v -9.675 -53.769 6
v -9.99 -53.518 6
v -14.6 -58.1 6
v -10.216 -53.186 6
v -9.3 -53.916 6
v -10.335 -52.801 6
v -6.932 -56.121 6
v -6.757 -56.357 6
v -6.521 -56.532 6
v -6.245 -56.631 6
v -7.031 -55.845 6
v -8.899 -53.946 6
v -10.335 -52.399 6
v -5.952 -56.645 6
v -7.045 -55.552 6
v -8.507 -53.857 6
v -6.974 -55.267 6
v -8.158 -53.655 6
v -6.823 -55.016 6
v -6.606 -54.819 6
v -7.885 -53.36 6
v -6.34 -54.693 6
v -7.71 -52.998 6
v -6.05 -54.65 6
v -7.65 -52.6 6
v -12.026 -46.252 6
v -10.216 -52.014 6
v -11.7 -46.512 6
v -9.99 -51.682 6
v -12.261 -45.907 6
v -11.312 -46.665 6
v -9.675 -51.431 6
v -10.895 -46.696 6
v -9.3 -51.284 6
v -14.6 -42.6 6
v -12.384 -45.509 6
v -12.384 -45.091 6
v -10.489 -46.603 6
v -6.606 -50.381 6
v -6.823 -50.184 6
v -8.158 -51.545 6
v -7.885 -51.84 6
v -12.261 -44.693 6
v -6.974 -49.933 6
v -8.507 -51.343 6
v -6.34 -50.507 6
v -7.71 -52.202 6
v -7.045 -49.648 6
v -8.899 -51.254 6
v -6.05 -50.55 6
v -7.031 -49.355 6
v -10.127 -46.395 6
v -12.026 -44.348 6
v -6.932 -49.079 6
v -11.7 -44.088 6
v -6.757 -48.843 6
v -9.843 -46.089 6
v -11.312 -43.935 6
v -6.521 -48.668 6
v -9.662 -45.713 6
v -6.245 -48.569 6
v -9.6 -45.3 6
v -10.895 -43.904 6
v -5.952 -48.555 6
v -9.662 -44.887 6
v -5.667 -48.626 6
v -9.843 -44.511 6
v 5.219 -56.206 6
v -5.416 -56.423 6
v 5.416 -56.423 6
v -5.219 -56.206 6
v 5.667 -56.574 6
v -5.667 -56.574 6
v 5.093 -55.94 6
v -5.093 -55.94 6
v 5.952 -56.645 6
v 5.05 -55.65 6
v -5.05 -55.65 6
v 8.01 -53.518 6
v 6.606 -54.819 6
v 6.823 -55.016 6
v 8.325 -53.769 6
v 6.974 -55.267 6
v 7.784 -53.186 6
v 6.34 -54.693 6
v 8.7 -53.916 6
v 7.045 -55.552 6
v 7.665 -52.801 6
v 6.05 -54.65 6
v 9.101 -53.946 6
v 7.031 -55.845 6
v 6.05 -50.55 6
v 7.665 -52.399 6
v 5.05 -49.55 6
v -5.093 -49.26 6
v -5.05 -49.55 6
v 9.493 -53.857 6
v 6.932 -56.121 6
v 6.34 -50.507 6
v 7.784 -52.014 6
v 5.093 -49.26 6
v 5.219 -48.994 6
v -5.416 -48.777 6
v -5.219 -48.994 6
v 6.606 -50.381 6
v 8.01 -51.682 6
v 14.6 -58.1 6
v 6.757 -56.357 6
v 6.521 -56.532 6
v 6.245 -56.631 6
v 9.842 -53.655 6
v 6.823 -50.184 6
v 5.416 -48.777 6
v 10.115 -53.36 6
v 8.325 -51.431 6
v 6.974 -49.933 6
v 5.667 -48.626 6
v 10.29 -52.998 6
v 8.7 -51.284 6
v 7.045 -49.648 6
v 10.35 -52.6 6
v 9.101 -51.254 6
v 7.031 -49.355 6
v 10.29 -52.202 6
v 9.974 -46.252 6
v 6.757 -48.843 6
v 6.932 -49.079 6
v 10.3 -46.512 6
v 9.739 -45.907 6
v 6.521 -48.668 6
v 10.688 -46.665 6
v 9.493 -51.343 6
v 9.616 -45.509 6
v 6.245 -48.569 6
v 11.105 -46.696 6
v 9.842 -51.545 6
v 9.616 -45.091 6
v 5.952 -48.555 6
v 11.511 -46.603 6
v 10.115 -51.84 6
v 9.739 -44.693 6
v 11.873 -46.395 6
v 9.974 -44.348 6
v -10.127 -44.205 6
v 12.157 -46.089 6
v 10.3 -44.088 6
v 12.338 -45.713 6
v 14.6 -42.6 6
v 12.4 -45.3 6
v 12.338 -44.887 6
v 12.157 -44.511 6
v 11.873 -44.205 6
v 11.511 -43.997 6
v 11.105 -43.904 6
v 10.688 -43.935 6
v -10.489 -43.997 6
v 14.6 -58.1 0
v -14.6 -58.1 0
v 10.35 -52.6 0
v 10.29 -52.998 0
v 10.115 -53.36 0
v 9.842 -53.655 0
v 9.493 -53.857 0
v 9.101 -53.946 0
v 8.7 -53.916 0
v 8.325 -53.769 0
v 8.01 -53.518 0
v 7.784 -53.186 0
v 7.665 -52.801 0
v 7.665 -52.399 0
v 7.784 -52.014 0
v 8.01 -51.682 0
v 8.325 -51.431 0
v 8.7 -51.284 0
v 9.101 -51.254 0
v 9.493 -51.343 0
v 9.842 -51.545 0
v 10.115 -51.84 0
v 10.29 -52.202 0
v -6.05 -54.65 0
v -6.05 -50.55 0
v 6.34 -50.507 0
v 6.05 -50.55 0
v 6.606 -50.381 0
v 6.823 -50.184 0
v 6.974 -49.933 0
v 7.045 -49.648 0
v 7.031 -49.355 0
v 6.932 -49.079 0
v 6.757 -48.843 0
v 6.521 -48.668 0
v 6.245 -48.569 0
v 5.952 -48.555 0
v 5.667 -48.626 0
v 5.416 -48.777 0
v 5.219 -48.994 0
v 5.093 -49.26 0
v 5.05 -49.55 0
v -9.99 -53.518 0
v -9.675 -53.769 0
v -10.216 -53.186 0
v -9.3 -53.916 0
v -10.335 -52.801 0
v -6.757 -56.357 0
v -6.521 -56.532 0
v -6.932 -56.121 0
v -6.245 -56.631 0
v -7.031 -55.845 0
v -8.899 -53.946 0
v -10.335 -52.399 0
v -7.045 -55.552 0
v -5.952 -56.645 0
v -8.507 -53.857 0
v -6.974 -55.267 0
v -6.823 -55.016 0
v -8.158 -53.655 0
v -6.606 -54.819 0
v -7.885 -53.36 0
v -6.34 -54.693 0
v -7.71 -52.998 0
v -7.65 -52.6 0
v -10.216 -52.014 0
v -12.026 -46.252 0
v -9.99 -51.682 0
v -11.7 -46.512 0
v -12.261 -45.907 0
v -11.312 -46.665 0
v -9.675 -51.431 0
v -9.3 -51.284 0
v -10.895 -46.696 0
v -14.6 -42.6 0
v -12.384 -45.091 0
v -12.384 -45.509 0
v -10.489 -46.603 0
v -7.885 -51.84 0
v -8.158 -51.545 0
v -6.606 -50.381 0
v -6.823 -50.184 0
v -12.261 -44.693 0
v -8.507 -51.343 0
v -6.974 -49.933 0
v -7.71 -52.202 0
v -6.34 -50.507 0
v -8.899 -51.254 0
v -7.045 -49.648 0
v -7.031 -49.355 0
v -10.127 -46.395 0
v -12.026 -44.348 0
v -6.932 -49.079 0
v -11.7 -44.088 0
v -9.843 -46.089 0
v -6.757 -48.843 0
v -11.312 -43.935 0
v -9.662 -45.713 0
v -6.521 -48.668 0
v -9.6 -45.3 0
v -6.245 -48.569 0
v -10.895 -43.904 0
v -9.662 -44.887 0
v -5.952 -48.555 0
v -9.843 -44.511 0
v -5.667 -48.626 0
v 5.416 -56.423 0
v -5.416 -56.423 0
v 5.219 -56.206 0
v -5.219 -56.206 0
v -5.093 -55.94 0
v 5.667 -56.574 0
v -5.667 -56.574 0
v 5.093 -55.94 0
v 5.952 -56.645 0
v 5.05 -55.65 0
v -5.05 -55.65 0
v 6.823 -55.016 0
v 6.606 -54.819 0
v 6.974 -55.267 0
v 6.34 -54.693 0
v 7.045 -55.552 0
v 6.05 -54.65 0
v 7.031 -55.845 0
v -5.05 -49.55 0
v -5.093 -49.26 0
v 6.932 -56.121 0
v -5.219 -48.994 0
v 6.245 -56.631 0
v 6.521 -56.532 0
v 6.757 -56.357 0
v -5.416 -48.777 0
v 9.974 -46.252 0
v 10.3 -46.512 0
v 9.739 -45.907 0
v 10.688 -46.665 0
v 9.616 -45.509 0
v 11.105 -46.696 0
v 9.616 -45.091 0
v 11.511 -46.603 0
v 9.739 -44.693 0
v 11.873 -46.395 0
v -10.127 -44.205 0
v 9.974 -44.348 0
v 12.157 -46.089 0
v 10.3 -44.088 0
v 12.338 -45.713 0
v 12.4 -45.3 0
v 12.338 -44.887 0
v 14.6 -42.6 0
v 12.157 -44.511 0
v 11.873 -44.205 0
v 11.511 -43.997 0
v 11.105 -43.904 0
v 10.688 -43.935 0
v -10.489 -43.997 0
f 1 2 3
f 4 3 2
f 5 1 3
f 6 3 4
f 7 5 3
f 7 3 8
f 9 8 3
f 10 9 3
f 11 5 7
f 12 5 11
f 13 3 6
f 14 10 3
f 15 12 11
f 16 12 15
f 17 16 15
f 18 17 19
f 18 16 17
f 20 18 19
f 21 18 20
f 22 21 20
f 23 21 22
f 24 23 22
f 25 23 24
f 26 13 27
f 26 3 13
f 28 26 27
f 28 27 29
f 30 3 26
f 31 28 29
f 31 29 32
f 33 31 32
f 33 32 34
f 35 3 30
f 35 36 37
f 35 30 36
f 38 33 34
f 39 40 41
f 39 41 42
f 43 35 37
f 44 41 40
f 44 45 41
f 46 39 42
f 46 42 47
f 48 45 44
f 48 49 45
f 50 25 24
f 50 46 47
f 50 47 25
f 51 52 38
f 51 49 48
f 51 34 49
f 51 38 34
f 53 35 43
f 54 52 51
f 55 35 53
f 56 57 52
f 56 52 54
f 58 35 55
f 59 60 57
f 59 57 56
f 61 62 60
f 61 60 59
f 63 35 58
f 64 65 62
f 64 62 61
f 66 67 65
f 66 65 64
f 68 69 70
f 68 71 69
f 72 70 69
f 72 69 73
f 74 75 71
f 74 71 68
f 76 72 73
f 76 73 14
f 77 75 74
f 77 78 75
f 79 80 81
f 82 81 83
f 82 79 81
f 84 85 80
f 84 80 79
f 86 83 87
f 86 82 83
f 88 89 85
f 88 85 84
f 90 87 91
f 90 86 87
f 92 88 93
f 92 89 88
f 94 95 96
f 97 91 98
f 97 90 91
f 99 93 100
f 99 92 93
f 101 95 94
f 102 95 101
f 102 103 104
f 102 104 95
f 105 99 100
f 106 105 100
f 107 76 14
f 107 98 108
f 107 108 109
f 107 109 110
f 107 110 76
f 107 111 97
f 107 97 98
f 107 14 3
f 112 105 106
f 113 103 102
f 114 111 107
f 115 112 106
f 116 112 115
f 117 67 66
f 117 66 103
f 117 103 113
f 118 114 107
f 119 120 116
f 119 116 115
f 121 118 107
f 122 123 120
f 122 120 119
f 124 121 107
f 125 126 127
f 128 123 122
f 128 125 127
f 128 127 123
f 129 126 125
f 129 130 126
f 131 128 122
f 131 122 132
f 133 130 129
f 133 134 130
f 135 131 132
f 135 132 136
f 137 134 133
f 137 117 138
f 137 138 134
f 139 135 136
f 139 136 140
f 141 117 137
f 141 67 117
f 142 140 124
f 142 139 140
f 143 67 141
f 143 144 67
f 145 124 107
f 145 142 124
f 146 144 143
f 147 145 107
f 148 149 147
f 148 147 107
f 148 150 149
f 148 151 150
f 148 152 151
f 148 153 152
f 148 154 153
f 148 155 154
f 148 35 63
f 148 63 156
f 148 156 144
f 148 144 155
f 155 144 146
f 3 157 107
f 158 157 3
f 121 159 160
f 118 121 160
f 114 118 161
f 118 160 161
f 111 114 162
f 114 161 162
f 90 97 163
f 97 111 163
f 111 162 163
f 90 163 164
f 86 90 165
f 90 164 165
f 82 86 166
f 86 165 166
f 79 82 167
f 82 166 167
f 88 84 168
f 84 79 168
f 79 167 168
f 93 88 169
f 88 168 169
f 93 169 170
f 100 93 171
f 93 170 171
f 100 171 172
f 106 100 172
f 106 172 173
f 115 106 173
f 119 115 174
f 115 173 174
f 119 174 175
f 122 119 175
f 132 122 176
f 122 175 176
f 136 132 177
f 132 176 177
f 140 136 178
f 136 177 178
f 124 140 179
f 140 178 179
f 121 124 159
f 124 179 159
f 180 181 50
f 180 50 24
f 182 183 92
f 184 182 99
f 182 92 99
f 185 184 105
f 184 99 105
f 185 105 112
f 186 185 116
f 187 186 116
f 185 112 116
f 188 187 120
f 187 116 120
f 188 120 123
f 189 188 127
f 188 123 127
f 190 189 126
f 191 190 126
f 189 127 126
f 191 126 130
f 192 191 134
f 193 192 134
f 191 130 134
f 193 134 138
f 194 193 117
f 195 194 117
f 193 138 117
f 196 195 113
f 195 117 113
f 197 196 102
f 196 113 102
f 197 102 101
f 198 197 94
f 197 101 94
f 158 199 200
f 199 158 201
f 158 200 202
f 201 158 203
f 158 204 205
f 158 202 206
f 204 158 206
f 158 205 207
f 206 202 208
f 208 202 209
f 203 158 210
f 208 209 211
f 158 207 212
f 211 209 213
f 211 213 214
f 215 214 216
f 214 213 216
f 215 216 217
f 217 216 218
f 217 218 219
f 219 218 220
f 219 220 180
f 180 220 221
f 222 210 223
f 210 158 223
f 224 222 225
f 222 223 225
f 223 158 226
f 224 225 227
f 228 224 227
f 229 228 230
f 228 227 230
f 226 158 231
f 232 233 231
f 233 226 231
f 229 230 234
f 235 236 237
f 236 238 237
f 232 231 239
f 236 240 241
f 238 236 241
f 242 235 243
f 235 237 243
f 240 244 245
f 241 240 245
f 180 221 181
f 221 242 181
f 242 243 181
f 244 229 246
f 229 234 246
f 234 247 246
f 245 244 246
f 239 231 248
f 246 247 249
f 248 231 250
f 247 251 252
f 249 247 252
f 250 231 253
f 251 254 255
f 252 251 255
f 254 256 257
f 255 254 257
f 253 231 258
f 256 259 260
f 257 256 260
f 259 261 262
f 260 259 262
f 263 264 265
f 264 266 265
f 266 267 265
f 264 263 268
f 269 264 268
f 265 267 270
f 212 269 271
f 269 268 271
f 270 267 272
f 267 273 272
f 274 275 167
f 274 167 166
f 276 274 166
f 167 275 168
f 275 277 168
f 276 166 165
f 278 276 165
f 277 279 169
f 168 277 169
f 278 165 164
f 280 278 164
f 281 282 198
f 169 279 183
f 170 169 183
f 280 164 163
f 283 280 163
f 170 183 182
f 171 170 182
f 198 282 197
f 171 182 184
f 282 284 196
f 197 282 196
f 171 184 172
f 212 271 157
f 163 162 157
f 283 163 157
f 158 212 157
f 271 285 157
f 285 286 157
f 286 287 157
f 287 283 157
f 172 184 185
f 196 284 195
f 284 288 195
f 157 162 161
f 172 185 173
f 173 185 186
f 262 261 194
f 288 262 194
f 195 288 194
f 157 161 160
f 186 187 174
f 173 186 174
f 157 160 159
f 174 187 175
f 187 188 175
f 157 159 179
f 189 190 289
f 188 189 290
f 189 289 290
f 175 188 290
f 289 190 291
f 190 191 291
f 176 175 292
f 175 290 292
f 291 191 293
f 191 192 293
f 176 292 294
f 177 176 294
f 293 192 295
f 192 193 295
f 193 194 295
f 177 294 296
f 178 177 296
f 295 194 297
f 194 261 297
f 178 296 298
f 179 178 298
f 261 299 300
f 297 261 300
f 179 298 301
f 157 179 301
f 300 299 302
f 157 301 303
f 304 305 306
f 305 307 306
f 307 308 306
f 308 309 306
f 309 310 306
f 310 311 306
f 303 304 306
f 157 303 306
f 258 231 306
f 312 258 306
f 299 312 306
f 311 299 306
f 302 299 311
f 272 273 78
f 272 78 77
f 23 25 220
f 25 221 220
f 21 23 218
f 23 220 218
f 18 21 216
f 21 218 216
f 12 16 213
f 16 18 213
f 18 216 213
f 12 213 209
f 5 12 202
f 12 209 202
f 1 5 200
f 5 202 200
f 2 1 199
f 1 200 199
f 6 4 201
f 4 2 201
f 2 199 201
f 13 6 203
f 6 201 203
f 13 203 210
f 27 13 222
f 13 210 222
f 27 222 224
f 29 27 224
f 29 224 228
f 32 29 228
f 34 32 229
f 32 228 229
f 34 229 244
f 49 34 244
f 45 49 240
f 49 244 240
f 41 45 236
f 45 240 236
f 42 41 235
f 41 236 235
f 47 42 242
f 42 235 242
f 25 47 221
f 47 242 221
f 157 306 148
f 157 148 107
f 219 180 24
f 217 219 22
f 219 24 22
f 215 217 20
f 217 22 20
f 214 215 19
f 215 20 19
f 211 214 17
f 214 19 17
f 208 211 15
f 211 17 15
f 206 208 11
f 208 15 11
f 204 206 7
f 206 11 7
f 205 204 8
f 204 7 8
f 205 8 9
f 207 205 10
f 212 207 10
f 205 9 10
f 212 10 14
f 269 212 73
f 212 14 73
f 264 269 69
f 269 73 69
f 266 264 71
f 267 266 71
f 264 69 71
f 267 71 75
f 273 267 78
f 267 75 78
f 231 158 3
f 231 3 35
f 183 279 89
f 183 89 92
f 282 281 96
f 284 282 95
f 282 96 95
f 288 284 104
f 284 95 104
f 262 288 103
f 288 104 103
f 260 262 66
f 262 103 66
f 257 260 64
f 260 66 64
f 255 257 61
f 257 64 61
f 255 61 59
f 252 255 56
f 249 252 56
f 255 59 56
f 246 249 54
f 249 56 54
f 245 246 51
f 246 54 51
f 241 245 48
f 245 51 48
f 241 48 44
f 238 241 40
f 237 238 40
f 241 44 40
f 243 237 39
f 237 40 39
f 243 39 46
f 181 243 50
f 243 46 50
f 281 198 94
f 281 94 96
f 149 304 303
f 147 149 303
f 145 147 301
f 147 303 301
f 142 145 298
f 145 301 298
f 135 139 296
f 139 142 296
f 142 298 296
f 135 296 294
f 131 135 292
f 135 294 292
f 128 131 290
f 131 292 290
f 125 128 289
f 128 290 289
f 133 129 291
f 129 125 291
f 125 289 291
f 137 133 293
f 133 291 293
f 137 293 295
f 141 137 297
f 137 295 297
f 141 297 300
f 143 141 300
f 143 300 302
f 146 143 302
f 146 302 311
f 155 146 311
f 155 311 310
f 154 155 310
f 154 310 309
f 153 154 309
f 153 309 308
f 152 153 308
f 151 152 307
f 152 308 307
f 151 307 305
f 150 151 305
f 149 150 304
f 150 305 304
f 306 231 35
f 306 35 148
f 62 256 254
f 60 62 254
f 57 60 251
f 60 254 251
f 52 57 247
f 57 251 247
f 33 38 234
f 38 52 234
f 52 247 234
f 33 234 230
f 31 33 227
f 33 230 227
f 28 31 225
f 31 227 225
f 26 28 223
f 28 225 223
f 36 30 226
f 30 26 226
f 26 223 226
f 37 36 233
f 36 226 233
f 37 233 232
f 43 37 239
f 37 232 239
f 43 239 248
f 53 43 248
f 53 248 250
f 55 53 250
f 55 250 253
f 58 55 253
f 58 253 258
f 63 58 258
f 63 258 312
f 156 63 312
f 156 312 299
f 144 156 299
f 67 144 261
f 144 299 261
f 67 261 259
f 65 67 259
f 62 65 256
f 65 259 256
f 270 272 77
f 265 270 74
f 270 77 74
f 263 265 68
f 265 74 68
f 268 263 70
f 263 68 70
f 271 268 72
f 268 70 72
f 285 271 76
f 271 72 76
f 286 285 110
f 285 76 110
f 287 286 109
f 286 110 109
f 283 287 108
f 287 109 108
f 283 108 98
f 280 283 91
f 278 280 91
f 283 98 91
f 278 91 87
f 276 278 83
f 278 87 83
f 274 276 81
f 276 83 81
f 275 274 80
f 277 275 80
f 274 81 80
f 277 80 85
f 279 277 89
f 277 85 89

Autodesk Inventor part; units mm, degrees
ref_plane "YZ Plane" through (0, 0, 0) normal (1, 0, 0) x (0, 1, 0)
ref_plane "XZ Plane" through (0, 0, 0) normal (0, 1, 0) x (-1, 0, 0)
ref_plane "XY Plane" through (0, 0, 0) normal (0, 0, 1) x (1, 0, 0)
ref_plane "작업 평면1" through (0, 0, 0) normal (0, 0, 1) x (1, 0, 0)
sketch "스케치1" plane through (0, 0, 0) normal (0, 0, 1) x (1, 0, 0)
  arc A0 (20.1, 4.5766) -> (19.5808, 6.2636) centre (17.1, 4.5766) ccw projected
  line L0 (19.5808, 6.2636) -> (15.5953, 12.1246) projected
  arc A1 (15.5953, 12.1246) -> (13.9414, 13) centre (13.9414, 11) ccw projected
  line L1 (13, 13) -> (13.9414, 13) projected
  arc A2 (14.5, 11.5) -> (13, 13) centre (13, 11.5) ccw projected
  line L2 (14.5, -41.5) -> (14.5, 11.5) projected
  arc A3 (13.5, -42.5) -> (14.5, -41.5) centre (13.5, -41.5) ccw projected
  line L3 (-13.5, -42.5) -> (13.5, -42.5) projected
  arc A4 (-14.5, -41.5) -> (-13.5, -42.5) centre (-13.5, -41.5) ccw projected
  line L4 (-14.5, 11.5) -> (-14.5, -41.5) projected
  arc A5 (-13, 13) -> (-14.5, 11.5) centre (-13, 11.5) ccw projected
  line L5 (-13.9414, 13) -> (-13, 13) projected
  arc A6 (-13.9414, 13) -> (-15.5953, 12.1246) centre (-13.9414, 11) ccw projected
  line L6 (-15.5953, 12.1246) -> (-19.5808, 6.2636) projected
  arc A7 (-19.5808, 6.2636) -> (-20.1, 4.5766) centre (-17.1, 4.5766) ccw projected
  line L7 (-20.1, 4.5766) -> (-20.1, -39.6766) projected
  arc A8 (-20.1, -39.6766) -> (-19.5808, -41.3636) centre (-17.1, -39.6766) ccw projected
  line L8 (-19.5808, -41.3636) -> (-15.8929, -46.7869) projected
  arc A9 (-15.8929, -46.7869) -> (-13.4121, -48.1) centre (-13.4121, -45.1) ccw projected
  line L9 (-13.4121, -48.1) -> (13.4121, -48.1) projected
  arc A10 (13.4121, -48.1) -> (15.8929, -46.7869) centre (13.4121, -45.1) ccw projected
  line L10 (15.8929, -46.7869) -> (19.5808, -41.3636) projected
  arc A11 (19.5808, -41.3636) -> (20.1, -39.6766) centre (17.1, -39.6766) ccw projected
  line L11 (20.1, -39.6766) -> (20.1, 4.5766) projected
  circle A12 centre (-17.3, 4) radius 1.35 projected
  circle A13 centre (-17.3, -18) radius 1.35 projected
  circle A14 centre (-11, -45.3) radius 1.35 projected
  circle A15 centre (17.3, 4) radius 1.35 projected
  circle A16 centre (17.3, -18) radius 1.35 projected
  circle A17 centre (11, -45.3) radius 1.35 projected
  circle A18 centre (-17.3, -40) radius 1.35 projected
  circle A19 centre (17.3, -40) radius 1.35 projected
  arc A20 (-14.6, -41.5) -> (-13.5, -42.6) centre (-13.5, -41.5) ccw
  line L12 (-13.5, -42.6) -> (13.5, -42.6)
  arc A21 (13.5, -42.6) -> (14.6, -41.5) centre (13.5, -41.5) ccw
  line L13 (14.6, -41.5) -> (14.6, 11.5)
  arc A22 (14.6, 11.5) -> (12.2254, 12.9) centre (13, 11.5) ccw
  line L14 (12.2254, 12.9) -> (13.9414, 12.9)
  arc A23 (15.5126, 12.0684) -> (13.9414, 12.9) centre (13.9414, 11) ccw
  line L15 (15.5126, 12.0684) -> (19.4981, 6.2073)
  arc A24 (20, 4.5766) -> (19.4981, 6.2073) centre (17.1, 4.5766) ccw
  line L16 (20, 4.5766) -> (20, -39.6766)
  arc A25 (19.4981, -41.3073) -> (20, -39.6766) centre (17.1, -39.6766) ccw
  line L17 (19.4981, -41.3073) -> (15.8102, -46.7307)
  arc A26 (14.6, -47.7455) -> (15.8102, -46.7307) centre (13.4121, -45.1) ccw
  arc A27 (-15.8102, -46.7307) -> (-14.6, -47.7455) centre (-13.4121, -45.1) ccw
  line L18 (-15.8102, -46.7307) -> (-19.4981, -41.3073)
  arc A28 (-20, -39.6766) -> (-19.4981, -41.3073) centre (-17.1, -39.6766) ccw
  line L19 (-20, -39.6766) -> (-20, 4.5766)
  arc A29 (-19.4981, 6.2073) -> (-20, 4.5766) centre (-17.1, 4.5766) ccw
  line L20 (-19.4981, 6.2073) -> (-15.5126, 12.0684)
  arc A30 (-13.9414, 12.9) -> (-15.5126, 12.0684) centre (-13.9414, 11) ccw
  line L21 (-13.9414, 12.9) -> (-12.2254, 12.9)
  arc A31 (-12.2254, 12.9) -> (-14.6, 11.5) centre (-13, 11.5) ccw
  line L22 (-14.6, 11.5) -> (-14.6, -41.5)
  line L23 (-14.6, -42.6) -> (14.6, -42.6)
  line L24 (14.6, -42.6) -> (14.6, -48.1)
  line L25 (14.6, -48.1) -> (-14.6, -48.1)
  line L26 (-14.6, -48.1) -> (-14.6, -42.6)
  line L27 (-14.6, -48.1) -> (14.6, -48.1)
  line L28 (14.6, -48.1) -> (14.6, -57.1)
  line L29 (14.6, -57.1) -> (-14.6, -57.1)
  line L30 (-14.6, -57.1) -> (-14.6, -48.1)
  circle A32 centre (-11, -45.3) radius 1.4
  circle A33 centre (11, -45.3) radius 1.4
  line L31 (-6.05, -55.65) -> (6.05, -55.65)
  line L32 (6.05, -55.65) -> (6.05, -49.55)
  line L33 (6.05, -49.55) -> (-6.05, -49.55)
  line L34 (-6.05, -49.55) -> (-6.05, -55.65)
  line L35 (-6.05, -55.65) -> (6.05, -49.55) construction
  line L36 (6.05, -55.65) -> (-6.05, -49.55) construction
  line L37 (-14.6, -57.1) -> (14.6, -57.1)
  line L38 (14.6, -57.1) -> (14.6, -58.1)
  line L39 (14.6, -58.1) -> (-14.6, -58.1)
  line L40 (-14.6, -58.1) -> (-14.6, -57.1)
  circle A34 centre (9, -52.6) radius 1.35
  circle A35 centre (-9, -52.6) radius 1.35
  point P0 (0, 0)
  point P1 (0, -52.6)
  point P2 (-13.5, -42.6)
  dimension "d0" = 0.1
  dimension "d1" = 9
  dimension "d2" = 2.8
  dimension "d3" = 2.8
  dimension "d4" = 12.1
  dimension "d5" = 6.1
  dimension "d8" = 1
  dimension "d9" = 2.7
  dimension "d10" = 2.7
extrude "돌출2" add sketch "스케치1" along normal blind 6 contours L24 L25 A10 | A10 L9 A9 L26 L23 L12 L24 | L25 L28 L29 L30 L9 | L25 L26 A9 | L38 L39 L40 L29
sketch "스케치2" plane through (0, 0, 6) normal (0, 0, 1) x (1, 0, 0)
  line L0 (-6.05, -49.55) -> (6.05, -49.55) projected
  line L1 (6.05, -49.55) -> (6.05, -55.65) projected
  line L2 (-6.05, -55.65) -> (-6.05, -49.55) projected
  line L3 (6.05, -55.65) -> (-6.05, -55.65) projected
  circle A0 centre (6.05, -49.55) radius 1
  circle A1 centre (-6.05, -49.55) radius 1
  circle A2 centre (-6.05, -55.65) radius 1
  circle A3 centre (6.05, -55.65) radius 1
  point P0 (0, 0)
  point P1 (5.05, -55.65)
  point P2 (6.05, -54.65)
  dimension "d14" = 2
  dimension "d15" = 2
  dimension "d16" = 2
  dimension "d17" = 2
extrude "돌출3" cut sketch "스케치2" against normal blind 10 contours L2 A1 L0 | L0 A1 L2 | A0 L1 L0 | L0 L1 A0 | A2 L3 L2 | L2 L3 A2 | A3 L3 L1 picked at (5.393, -55.7298)
properties part number "chest connector_fixing part" material "PMMA 플라스틱"
